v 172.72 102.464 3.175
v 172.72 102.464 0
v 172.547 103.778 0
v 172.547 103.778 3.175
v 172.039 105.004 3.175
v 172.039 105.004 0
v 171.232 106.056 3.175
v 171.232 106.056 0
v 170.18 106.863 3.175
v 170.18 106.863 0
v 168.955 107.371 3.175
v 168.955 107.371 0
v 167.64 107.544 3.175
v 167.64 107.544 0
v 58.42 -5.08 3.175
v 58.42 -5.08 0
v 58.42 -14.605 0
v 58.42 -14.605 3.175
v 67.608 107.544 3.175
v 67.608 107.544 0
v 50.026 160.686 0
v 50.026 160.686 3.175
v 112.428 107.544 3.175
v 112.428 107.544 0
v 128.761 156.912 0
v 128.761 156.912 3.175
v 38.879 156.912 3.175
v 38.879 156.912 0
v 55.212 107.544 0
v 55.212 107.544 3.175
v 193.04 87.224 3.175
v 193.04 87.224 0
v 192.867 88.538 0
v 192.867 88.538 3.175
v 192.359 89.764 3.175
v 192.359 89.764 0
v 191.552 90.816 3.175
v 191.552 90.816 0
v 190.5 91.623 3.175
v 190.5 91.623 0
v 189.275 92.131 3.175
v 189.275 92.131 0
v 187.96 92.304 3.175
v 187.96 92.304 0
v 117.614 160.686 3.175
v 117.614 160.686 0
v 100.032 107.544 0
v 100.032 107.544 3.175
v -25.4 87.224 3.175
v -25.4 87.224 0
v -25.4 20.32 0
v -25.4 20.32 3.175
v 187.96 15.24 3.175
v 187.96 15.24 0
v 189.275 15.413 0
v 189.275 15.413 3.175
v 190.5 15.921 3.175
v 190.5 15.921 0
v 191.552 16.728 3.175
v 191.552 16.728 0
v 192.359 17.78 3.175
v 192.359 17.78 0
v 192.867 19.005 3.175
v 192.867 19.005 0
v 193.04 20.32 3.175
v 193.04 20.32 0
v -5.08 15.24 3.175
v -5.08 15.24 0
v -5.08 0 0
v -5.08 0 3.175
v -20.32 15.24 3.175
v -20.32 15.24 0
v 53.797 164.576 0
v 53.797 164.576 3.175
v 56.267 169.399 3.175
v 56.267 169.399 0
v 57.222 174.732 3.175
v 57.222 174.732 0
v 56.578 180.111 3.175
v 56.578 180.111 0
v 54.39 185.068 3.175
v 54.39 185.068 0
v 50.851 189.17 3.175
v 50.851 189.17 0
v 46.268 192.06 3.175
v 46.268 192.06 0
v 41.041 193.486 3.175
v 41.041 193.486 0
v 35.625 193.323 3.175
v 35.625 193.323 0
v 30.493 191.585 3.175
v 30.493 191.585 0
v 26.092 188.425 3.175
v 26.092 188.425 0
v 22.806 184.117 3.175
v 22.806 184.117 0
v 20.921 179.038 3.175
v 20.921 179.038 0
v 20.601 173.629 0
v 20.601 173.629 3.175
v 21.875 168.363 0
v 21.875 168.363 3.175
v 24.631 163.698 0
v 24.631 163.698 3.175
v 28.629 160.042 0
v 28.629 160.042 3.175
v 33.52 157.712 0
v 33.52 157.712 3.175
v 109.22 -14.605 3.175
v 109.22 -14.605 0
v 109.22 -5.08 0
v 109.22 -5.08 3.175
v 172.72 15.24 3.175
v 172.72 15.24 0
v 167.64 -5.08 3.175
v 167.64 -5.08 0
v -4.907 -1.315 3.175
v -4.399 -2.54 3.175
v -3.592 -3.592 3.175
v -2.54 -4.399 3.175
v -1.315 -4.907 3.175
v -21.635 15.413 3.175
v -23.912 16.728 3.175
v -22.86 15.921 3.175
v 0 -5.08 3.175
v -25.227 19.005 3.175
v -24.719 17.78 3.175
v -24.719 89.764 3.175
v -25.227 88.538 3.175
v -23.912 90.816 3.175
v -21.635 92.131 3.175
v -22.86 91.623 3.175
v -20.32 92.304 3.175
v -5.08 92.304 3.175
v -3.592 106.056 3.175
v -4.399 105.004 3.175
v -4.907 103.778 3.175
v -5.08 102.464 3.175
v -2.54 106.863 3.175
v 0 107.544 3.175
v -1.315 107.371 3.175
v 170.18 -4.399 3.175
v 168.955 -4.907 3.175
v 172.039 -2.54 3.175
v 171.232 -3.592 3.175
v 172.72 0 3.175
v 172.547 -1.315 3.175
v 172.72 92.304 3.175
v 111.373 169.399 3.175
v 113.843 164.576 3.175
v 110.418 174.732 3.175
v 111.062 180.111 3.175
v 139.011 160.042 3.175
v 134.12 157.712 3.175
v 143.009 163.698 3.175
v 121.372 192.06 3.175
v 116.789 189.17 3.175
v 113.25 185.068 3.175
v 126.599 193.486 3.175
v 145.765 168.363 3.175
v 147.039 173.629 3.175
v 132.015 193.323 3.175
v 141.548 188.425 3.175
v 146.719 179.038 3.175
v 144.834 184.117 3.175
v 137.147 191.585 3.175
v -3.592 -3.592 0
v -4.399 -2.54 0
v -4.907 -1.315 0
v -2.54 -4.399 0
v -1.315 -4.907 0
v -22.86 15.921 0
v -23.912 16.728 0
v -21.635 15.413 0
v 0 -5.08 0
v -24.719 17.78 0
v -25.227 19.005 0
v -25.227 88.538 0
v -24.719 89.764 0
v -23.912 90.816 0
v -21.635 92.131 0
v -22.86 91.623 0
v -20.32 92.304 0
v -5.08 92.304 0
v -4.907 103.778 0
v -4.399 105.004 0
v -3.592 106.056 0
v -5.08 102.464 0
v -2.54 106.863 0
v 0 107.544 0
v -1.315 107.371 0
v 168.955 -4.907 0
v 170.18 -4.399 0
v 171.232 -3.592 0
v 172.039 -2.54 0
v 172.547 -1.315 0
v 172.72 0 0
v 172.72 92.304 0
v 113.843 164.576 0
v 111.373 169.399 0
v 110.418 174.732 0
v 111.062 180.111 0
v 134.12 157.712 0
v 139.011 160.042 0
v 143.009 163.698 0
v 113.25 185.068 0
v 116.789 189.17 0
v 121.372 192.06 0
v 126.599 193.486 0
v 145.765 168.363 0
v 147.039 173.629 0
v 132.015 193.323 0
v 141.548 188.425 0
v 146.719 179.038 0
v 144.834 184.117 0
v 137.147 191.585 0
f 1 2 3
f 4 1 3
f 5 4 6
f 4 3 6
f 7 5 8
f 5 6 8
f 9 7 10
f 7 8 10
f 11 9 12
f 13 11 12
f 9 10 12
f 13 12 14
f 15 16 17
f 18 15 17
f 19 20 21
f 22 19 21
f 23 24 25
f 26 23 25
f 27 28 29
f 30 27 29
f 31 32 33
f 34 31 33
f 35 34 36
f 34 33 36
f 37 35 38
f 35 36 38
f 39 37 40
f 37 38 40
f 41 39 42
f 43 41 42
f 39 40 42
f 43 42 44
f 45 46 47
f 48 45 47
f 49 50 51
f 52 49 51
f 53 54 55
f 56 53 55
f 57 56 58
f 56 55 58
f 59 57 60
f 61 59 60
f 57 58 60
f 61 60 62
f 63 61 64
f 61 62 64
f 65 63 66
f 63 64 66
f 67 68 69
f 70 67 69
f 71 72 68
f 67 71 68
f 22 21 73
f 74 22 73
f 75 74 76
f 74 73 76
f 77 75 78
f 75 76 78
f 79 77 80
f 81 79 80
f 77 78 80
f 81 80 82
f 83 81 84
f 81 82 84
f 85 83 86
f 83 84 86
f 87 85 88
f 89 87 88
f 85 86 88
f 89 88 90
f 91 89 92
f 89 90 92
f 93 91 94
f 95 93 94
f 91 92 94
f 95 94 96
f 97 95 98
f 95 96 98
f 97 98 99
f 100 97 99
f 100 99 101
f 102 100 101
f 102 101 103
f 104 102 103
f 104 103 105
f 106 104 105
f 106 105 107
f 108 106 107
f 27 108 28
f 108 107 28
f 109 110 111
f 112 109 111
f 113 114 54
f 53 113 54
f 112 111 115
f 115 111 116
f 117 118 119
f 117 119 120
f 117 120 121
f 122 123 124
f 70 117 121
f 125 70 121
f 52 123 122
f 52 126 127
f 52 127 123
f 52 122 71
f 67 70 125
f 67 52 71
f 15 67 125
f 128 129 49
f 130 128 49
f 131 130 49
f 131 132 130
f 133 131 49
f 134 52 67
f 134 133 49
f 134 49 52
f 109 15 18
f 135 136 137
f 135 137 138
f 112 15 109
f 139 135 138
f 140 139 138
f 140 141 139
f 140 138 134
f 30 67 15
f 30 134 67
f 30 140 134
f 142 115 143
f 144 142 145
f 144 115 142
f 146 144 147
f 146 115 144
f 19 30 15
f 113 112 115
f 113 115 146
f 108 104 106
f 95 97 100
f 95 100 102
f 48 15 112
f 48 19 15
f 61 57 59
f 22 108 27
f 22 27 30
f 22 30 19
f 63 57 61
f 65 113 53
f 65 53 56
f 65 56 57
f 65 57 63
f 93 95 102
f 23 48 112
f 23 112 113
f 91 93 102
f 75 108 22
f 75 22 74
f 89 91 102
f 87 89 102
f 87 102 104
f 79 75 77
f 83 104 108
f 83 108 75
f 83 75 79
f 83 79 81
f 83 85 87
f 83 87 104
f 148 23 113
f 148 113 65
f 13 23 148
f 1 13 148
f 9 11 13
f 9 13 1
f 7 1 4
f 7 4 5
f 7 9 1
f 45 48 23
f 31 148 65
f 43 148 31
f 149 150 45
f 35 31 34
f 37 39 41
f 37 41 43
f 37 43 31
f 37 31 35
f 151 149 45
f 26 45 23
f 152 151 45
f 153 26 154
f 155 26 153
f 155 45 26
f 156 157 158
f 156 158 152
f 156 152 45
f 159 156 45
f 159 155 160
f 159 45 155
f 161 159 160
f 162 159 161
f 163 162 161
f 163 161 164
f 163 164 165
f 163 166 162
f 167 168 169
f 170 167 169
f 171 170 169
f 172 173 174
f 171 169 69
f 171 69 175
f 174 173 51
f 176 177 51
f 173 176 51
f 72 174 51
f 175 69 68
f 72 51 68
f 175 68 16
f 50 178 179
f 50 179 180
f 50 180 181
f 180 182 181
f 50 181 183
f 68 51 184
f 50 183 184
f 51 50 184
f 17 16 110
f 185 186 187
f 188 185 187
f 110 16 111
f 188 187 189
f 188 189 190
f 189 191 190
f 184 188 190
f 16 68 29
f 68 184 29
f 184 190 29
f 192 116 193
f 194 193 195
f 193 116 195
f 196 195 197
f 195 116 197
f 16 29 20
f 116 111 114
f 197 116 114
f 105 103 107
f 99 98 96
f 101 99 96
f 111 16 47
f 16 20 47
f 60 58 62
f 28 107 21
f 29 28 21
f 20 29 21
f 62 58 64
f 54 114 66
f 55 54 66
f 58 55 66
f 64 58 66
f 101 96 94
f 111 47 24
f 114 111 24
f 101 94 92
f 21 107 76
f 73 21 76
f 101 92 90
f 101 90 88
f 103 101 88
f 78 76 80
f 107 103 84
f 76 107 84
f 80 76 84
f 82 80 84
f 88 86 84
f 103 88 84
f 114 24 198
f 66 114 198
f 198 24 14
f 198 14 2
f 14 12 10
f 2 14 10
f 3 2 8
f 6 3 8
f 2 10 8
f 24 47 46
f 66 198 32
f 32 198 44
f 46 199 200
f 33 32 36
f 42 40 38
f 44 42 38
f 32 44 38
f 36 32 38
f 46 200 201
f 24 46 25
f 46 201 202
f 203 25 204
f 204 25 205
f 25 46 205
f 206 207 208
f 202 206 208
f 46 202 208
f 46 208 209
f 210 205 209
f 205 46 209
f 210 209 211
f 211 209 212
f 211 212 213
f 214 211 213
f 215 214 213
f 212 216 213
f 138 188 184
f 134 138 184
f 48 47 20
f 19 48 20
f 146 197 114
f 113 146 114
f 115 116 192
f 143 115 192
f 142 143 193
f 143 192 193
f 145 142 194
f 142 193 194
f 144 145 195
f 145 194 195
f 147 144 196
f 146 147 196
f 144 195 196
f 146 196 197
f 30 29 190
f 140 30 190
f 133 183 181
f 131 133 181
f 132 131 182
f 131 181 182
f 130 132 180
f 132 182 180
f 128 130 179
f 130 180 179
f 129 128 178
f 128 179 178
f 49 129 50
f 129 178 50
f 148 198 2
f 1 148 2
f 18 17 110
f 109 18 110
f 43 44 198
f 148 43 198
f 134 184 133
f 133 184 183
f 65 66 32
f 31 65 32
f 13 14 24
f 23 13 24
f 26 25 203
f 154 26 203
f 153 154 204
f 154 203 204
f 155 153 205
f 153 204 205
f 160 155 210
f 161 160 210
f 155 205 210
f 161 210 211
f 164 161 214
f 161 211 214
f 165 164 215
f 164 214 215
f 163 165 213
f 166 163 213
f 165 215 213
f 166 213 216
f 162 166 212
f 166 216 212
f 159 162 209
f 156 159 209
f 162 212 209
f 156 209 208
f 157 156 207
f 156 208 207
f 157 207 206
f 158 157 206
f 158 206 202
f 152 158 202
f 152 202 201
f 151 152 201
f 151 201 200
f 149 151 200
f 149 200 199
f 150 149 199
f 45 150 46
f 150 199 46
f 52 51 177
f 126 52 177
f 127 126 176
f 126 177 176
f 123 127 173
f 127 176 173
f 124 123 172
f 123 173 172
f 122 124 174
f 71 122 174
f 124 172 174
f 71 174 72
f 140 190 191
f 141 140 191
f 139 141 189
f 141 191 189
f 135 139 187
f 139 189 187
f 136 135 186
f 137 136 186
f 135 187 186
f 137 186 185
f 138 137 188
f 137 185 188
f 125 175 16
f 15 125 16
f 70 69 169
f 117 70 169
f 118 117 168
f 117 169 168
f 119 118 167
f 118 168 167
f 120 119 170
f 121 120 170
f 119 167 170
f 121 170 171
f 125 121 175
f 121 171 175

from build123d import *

# Parameters (mm, degrees)
BOSS_EXTRUDE1_DEPTH = 3.175


with BuildPart() as part:
    # Sketch1 → Boss-Extrude1 (new body)
    with BuildSketch(Plane.XY):
        with BuildLine():
            Line((0, -5.08), (58.42, -5.08))
            Line((58.42, -5.08), (58.42, -14.605))
            Line((58.42, -14.605), (109.22, -14.605))
            Line((109.22, -14.605), (109.22, -5.08))
            Line((109.22, -5.08), (167.64, -5.08))
            ThreePointArc((167.64, -5.08), (171.232102448, -3.592102448), (172.72, 0))
            Line((172.72, 0), (172.72, 15.24))
            Line((172.72, 15.24), (187.96, 15.24))
            ThreePointArc((187.96, 15.24), (191.552102448, 16.727897552), (193.04, 20.32))
            Line((193.04, 20.32), (193.04, 87.2236))
            ThreePointArc((193.04, 87.2236), (191.552102448, 90.815702448), (187.96, 92.3036))
            Line((187.96, 92.3036), (172.72, 92.3036))
            Line((172.72, 92.3036), (172.72, 102.4636))
            ThreePointArc((172.72, 102.4636), (171.232102448, 106.055702448), (167.64, 107.5436))
            Line((167.64, 107.5436), (112.428072163, 107.5436))
            Line((112.428072163, 107.5436), (128.760921922, 156.912121991))
            ThreePointArc((128.760921922, 156.912121991), (134.645312677, 192.644346081), (117.613615035, 160.685948618))
            Line((117.613615035, 160.685948618), (100.032250213, 107.5436))
            Line((100.032250213, 107.5436), (67.607749787, 107.5436))
            Line((67.607749787, 107.5436), (50.026384965, 160.685948618))
            ThreePointArc((50.026384965, 160.685948618), (32.994687323, 192.644346081), (38.879078078, 156.912121991))
            Line((38.879078078, 156.912121991), (55.211927837, 107.5436))
            Line((55.211927837, 107.5436), (0, 107.5436))
            ThreePointArc((0, 107.5436), (-3.592102448, 106.055702448), (-5.08, 102.4636))
            Line((-5.08, 102.4636), (-5.08, 92.3036))
            Line((-5.08, 92.3036), (-20.32, 92.3036))
            ThreePointArc((-20.32, 92.3036), (-23.912102448, 90.815702448), (-25.4, 87.2236))
            Line((-25.4, 87.2236), (-25.4, 20.32))
            ThreePointArc((-25.4, 20.32), (-23.912102448, 16.727897552), (-20.32, 15.24))
            Line((-20.32, 15.24), (-5.08, 15.24))
            Line((-5.08, 15.24), (-5.08, 0))
            ThreePointArc((-5.08, 0), (-3.592102448, -3.592102448), (0, -5.08))
        make_face()
    extrude(amount=BOSS_EXTRUDE1_DEPTH)


solid = part.part
